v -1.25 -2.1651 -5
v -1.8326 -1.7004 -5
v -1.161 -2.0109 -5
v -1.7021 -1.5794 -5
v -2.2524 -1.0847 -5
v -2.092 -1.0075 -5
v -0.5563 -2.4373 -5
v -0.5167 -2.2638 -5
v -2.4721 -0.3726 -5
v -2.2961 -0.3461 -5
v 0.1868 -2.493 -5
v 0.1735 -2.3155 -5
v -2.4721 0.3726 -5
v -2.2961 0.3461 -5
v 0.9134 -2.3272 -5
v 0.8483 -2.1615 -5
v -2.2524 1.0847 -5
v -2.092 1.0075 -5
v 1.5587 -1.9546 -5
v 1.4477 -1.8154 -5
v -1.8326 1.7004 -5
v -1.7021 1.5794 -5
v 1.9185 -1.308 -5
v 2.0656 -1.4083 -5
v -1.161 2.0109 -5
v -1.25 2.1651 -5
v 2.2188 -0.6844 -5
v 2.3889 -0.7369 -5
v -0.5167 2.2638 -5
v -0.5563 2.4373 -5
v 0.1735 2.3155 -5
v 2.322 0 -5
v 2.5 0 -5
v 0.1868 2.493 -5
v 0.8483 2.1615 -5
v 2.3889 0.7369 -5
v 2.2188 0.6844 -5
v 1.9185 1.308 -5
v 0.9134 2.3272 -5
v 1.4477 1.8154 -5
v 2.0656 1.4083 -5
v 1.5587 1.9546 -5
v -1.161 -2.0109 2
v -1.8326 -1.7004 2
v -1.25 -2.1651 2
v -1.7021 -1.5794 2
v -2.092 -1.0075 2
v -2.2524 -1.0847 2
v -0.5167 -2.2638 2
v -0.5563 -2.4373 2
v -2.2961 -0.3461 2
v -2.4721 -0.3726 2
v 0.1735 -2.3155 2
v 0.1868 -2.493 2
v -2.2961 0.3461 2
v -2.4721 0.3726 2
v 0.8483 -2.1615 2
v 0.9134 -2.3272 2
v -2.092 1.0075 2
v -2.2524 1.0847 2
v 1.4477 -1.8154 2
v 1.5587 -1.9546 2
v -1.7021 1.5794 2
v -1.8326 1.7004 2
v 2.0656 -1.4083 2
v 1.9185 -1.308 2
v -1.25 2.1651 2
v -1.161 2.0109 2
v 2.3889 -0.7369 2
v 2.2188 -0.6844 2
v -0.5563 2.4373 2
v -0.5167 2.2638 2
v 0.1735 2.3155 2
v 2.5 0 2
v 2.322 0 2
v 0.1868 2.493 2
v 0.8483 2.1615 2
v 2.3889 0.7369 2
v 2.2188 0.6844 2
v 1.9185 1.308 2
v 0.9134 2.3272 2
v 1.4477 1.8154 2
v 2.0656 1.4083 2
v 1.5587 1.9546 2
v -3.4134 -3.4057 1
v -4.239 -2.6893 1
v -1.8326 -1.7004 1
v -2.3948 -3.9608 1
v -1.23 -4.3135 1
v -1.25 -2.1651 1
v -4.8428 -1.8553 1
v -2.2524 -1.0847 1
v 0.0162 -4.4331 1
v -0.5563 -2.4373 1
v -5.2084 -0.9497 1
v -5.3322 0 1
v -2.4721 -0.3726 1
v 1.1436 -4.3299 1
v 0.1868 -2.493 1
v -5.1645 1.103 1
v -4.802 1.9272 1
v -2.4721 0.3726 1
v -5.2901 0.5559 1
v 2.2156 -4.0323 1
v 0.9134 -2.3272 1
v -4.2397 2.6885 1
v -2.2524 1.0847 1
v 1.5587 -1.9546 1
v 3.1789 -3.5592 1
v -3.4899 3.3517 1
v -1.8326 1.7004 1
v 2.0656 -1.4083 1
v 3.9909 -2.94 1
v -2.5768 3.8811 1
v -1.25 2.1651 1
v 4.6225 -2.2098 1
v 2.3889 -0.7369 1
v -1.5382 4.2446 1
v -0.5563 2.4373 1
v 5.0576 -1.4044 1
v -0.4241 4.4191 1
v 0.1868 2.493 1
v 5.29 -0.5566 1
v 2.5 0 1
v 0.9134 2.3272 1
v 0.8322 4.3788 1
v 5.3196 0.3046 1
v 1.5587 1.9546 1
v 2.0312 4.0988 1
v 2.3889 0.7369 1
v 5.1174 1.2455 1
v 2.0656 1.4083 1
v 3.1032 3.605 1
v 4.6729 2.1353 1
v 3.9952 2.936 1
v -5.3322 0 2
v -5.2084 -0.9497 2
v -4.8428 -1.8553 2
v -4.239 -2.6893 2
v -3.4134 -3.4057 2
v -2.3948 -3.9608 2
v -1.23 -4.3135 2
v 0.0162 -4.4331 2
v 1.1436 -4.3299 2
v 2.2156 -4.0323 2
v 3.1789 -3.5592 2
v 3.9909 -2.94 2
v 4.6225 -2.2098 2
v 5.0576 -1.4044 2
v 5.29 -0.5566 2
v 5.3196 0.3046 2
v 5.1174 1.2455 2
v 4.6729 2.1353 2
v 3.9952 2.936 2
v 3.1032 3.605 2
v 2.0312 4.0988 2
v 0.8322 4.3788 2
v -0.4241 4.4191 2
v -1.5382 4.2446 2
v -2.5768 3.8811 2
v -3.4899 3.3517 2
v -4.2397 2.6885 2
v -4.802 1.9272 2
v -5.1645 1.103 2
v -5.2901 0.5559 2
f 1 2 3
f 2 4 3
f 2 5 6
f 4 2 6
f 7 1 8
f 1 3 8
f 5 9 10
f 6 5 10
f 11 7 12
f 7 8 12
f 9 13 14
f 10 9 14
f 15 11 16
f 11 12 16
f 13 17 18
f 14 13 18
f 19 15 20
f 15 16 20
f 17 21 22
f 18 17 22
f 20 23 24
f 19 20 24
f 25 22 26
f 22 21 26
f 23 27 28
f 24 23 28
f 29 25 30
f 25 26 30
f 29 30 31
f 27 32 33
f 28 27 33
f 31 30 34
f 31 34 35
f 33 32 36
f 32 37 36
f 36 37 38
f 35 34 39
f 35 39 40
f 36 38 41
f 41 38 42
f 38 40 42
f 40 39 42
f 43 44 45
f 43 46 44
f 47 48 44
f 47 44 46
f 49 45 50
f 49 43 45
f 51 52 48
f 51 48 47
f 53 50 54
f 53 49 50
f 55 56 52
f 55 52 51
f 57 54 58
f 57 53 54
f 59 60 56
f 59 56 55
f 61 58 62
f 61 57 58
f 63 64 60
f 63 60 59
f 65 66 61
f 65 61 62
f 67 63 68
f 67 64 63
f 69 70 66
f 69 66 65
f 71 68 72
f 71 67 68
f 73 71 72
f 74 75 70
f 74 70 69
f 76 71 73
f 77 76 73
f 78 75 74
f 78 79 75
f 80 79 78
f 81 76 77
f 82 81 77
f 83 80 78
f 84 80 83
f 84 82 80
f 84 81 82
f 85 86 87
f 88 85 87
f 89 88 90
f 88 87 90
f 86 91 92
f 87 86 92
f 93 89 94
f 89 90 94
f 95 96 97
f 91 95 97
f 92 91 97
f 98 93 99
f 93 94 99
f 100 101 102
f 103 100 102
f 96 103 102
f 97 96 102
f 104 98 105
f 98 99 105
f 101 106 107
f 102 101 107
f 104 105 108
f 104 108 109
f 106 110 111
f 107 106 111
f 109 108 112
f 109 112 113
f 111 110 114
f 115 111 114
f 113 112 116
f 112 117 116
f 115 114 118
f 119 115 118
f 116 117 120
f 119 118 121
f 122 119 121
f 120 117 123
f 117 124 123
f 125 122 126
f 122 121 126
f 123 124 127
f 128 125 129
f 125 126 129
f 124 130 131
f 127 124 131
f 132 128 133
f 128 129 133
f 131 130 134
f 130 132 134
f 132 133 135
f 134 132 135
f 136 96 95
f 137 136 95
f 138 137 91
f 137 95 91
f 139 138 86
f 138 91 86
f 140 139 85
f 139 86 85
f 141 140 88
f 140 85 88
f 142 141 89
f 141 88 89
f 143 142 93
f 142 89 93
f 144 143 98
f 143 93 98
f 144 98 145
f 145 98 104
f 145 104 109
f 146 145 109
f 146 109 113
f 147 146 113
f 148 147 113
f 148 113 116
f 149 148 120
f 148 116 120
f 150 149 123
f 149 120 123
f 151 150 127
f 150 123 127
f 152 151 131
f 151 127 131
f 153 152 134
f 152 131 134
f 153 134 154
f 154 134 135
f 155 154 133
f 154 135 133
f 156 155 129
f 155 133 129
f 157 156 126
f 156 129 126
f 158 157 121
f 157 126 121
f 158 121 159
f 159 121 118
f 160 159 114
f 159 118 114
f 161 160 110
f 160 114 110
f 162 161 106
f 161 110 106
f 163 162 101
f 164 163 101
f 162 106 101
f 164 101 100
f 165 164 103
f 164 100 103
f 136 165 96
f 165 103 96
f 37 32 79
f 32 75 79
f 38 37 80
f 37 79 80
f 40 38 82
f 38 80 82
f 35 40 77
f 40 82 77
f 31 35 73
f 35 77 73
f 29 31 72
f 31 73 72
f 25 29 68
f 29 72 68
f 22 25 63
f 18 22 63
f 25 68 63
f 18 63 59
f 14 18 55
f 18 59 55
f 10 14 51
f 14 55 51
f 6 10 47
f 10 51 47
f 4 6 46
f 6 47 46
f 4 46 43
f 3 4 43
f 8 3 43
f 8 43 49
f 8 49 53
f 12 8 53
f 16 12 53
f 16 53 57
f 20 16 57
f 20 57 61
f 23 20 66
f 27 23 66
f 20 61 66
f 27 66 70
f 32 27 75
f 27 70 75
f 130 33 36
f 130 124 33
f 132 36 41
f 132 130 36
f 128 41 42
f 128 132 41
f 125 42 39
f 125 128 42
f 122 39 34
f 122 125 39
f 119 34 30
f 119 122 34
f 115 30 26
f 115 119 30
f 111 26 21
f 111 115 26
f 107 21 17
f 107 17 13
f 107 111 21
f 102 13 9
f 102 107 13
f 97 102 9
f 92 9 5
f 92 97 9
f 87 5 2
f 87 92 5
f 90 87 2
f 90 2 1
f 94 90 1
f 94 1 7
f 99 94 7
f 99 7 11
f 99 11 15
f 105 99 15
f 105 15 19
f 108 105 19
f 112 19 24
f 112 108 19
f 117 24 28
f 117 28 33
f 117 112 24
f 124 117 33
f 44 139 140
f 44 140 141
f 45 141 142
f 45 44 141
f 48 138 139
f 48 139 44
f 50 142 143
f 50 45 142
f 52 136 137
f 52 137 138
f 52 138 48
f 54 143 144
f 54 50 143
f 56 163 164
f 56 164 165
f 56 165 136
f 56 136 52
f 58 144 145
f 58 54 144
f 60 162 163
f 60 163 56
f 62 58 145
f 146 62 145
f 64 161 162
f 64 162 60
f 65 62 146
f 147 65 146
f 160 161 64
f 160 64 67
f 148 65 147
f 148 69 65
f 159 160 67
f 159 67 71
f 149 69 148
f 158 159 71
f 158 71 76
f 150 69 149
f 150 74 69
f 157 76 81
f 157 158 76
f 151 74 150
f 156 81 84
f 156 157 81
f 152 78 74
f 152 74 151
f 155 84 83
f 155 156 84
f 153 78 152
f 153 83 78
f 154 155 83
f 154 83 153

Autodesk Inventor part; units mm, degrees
ref_plane "YZ Plane" through (0, 0, 0) normal (1, 0, 0) x (0, 1, 0)
ref_plane "XZ Plane" through (0, 0, 0) normal (0, 1, 0) x (-1, 0, 0)
ref_plane "XY Plane" through (0, 0, 0) normal (0, 0, 1) x (1, 0, 0)
sketch "Sketch1" plane through (0, 0, 0) normal (0, 0, 1) x (1, 0, 0)
  circle A0 centre (0, 0) radius 2.5 projected
  circle A1 centre (0, 0) radius 1.9202
  point P0 (0, 0)
extrude "Extrusion1" add sketch "Sketch1" against normal blind 5
sketch "Sketch2" plane through (0, 0, 0) normal (0, 0, 1) x (1, 0, 0)
  circle A0 centre (0, 0) radius 1.9202 projected
  circle A1 centre (0, 0) radius 2.5 projected
  point P0 (0, 0)
extrude "Extrusion2" add sketch "Sketch2" along normal blind 1
sketch "Sketch3" plane through (0, 0, 1) normal (0, 0, 1) x (1, 0, 0)
  circle A0 centre (0, 0) radius 1.9202 projected
  circle A1 centre (0, 0) radius 2.5 projected
  ellipse E0 centre (0, 0) end of major axis (-5.3322, 0) minor radius 4.4331
  point P0 (0, 0)
extrude "Extrusion3" add sketch "Sketch3" along normal blind 1 contours A1 | E0
sketch "Sketch4" plane through (0, 0, 2) normal (0, 0, 1) x (1, 0, 0)
  circle A0 centre (0, 0) radius 2.322
extrude "Extrusion4" cut sketch "Sketch4" against normal through all
properties part number "Pushfit-adapter-cap"
